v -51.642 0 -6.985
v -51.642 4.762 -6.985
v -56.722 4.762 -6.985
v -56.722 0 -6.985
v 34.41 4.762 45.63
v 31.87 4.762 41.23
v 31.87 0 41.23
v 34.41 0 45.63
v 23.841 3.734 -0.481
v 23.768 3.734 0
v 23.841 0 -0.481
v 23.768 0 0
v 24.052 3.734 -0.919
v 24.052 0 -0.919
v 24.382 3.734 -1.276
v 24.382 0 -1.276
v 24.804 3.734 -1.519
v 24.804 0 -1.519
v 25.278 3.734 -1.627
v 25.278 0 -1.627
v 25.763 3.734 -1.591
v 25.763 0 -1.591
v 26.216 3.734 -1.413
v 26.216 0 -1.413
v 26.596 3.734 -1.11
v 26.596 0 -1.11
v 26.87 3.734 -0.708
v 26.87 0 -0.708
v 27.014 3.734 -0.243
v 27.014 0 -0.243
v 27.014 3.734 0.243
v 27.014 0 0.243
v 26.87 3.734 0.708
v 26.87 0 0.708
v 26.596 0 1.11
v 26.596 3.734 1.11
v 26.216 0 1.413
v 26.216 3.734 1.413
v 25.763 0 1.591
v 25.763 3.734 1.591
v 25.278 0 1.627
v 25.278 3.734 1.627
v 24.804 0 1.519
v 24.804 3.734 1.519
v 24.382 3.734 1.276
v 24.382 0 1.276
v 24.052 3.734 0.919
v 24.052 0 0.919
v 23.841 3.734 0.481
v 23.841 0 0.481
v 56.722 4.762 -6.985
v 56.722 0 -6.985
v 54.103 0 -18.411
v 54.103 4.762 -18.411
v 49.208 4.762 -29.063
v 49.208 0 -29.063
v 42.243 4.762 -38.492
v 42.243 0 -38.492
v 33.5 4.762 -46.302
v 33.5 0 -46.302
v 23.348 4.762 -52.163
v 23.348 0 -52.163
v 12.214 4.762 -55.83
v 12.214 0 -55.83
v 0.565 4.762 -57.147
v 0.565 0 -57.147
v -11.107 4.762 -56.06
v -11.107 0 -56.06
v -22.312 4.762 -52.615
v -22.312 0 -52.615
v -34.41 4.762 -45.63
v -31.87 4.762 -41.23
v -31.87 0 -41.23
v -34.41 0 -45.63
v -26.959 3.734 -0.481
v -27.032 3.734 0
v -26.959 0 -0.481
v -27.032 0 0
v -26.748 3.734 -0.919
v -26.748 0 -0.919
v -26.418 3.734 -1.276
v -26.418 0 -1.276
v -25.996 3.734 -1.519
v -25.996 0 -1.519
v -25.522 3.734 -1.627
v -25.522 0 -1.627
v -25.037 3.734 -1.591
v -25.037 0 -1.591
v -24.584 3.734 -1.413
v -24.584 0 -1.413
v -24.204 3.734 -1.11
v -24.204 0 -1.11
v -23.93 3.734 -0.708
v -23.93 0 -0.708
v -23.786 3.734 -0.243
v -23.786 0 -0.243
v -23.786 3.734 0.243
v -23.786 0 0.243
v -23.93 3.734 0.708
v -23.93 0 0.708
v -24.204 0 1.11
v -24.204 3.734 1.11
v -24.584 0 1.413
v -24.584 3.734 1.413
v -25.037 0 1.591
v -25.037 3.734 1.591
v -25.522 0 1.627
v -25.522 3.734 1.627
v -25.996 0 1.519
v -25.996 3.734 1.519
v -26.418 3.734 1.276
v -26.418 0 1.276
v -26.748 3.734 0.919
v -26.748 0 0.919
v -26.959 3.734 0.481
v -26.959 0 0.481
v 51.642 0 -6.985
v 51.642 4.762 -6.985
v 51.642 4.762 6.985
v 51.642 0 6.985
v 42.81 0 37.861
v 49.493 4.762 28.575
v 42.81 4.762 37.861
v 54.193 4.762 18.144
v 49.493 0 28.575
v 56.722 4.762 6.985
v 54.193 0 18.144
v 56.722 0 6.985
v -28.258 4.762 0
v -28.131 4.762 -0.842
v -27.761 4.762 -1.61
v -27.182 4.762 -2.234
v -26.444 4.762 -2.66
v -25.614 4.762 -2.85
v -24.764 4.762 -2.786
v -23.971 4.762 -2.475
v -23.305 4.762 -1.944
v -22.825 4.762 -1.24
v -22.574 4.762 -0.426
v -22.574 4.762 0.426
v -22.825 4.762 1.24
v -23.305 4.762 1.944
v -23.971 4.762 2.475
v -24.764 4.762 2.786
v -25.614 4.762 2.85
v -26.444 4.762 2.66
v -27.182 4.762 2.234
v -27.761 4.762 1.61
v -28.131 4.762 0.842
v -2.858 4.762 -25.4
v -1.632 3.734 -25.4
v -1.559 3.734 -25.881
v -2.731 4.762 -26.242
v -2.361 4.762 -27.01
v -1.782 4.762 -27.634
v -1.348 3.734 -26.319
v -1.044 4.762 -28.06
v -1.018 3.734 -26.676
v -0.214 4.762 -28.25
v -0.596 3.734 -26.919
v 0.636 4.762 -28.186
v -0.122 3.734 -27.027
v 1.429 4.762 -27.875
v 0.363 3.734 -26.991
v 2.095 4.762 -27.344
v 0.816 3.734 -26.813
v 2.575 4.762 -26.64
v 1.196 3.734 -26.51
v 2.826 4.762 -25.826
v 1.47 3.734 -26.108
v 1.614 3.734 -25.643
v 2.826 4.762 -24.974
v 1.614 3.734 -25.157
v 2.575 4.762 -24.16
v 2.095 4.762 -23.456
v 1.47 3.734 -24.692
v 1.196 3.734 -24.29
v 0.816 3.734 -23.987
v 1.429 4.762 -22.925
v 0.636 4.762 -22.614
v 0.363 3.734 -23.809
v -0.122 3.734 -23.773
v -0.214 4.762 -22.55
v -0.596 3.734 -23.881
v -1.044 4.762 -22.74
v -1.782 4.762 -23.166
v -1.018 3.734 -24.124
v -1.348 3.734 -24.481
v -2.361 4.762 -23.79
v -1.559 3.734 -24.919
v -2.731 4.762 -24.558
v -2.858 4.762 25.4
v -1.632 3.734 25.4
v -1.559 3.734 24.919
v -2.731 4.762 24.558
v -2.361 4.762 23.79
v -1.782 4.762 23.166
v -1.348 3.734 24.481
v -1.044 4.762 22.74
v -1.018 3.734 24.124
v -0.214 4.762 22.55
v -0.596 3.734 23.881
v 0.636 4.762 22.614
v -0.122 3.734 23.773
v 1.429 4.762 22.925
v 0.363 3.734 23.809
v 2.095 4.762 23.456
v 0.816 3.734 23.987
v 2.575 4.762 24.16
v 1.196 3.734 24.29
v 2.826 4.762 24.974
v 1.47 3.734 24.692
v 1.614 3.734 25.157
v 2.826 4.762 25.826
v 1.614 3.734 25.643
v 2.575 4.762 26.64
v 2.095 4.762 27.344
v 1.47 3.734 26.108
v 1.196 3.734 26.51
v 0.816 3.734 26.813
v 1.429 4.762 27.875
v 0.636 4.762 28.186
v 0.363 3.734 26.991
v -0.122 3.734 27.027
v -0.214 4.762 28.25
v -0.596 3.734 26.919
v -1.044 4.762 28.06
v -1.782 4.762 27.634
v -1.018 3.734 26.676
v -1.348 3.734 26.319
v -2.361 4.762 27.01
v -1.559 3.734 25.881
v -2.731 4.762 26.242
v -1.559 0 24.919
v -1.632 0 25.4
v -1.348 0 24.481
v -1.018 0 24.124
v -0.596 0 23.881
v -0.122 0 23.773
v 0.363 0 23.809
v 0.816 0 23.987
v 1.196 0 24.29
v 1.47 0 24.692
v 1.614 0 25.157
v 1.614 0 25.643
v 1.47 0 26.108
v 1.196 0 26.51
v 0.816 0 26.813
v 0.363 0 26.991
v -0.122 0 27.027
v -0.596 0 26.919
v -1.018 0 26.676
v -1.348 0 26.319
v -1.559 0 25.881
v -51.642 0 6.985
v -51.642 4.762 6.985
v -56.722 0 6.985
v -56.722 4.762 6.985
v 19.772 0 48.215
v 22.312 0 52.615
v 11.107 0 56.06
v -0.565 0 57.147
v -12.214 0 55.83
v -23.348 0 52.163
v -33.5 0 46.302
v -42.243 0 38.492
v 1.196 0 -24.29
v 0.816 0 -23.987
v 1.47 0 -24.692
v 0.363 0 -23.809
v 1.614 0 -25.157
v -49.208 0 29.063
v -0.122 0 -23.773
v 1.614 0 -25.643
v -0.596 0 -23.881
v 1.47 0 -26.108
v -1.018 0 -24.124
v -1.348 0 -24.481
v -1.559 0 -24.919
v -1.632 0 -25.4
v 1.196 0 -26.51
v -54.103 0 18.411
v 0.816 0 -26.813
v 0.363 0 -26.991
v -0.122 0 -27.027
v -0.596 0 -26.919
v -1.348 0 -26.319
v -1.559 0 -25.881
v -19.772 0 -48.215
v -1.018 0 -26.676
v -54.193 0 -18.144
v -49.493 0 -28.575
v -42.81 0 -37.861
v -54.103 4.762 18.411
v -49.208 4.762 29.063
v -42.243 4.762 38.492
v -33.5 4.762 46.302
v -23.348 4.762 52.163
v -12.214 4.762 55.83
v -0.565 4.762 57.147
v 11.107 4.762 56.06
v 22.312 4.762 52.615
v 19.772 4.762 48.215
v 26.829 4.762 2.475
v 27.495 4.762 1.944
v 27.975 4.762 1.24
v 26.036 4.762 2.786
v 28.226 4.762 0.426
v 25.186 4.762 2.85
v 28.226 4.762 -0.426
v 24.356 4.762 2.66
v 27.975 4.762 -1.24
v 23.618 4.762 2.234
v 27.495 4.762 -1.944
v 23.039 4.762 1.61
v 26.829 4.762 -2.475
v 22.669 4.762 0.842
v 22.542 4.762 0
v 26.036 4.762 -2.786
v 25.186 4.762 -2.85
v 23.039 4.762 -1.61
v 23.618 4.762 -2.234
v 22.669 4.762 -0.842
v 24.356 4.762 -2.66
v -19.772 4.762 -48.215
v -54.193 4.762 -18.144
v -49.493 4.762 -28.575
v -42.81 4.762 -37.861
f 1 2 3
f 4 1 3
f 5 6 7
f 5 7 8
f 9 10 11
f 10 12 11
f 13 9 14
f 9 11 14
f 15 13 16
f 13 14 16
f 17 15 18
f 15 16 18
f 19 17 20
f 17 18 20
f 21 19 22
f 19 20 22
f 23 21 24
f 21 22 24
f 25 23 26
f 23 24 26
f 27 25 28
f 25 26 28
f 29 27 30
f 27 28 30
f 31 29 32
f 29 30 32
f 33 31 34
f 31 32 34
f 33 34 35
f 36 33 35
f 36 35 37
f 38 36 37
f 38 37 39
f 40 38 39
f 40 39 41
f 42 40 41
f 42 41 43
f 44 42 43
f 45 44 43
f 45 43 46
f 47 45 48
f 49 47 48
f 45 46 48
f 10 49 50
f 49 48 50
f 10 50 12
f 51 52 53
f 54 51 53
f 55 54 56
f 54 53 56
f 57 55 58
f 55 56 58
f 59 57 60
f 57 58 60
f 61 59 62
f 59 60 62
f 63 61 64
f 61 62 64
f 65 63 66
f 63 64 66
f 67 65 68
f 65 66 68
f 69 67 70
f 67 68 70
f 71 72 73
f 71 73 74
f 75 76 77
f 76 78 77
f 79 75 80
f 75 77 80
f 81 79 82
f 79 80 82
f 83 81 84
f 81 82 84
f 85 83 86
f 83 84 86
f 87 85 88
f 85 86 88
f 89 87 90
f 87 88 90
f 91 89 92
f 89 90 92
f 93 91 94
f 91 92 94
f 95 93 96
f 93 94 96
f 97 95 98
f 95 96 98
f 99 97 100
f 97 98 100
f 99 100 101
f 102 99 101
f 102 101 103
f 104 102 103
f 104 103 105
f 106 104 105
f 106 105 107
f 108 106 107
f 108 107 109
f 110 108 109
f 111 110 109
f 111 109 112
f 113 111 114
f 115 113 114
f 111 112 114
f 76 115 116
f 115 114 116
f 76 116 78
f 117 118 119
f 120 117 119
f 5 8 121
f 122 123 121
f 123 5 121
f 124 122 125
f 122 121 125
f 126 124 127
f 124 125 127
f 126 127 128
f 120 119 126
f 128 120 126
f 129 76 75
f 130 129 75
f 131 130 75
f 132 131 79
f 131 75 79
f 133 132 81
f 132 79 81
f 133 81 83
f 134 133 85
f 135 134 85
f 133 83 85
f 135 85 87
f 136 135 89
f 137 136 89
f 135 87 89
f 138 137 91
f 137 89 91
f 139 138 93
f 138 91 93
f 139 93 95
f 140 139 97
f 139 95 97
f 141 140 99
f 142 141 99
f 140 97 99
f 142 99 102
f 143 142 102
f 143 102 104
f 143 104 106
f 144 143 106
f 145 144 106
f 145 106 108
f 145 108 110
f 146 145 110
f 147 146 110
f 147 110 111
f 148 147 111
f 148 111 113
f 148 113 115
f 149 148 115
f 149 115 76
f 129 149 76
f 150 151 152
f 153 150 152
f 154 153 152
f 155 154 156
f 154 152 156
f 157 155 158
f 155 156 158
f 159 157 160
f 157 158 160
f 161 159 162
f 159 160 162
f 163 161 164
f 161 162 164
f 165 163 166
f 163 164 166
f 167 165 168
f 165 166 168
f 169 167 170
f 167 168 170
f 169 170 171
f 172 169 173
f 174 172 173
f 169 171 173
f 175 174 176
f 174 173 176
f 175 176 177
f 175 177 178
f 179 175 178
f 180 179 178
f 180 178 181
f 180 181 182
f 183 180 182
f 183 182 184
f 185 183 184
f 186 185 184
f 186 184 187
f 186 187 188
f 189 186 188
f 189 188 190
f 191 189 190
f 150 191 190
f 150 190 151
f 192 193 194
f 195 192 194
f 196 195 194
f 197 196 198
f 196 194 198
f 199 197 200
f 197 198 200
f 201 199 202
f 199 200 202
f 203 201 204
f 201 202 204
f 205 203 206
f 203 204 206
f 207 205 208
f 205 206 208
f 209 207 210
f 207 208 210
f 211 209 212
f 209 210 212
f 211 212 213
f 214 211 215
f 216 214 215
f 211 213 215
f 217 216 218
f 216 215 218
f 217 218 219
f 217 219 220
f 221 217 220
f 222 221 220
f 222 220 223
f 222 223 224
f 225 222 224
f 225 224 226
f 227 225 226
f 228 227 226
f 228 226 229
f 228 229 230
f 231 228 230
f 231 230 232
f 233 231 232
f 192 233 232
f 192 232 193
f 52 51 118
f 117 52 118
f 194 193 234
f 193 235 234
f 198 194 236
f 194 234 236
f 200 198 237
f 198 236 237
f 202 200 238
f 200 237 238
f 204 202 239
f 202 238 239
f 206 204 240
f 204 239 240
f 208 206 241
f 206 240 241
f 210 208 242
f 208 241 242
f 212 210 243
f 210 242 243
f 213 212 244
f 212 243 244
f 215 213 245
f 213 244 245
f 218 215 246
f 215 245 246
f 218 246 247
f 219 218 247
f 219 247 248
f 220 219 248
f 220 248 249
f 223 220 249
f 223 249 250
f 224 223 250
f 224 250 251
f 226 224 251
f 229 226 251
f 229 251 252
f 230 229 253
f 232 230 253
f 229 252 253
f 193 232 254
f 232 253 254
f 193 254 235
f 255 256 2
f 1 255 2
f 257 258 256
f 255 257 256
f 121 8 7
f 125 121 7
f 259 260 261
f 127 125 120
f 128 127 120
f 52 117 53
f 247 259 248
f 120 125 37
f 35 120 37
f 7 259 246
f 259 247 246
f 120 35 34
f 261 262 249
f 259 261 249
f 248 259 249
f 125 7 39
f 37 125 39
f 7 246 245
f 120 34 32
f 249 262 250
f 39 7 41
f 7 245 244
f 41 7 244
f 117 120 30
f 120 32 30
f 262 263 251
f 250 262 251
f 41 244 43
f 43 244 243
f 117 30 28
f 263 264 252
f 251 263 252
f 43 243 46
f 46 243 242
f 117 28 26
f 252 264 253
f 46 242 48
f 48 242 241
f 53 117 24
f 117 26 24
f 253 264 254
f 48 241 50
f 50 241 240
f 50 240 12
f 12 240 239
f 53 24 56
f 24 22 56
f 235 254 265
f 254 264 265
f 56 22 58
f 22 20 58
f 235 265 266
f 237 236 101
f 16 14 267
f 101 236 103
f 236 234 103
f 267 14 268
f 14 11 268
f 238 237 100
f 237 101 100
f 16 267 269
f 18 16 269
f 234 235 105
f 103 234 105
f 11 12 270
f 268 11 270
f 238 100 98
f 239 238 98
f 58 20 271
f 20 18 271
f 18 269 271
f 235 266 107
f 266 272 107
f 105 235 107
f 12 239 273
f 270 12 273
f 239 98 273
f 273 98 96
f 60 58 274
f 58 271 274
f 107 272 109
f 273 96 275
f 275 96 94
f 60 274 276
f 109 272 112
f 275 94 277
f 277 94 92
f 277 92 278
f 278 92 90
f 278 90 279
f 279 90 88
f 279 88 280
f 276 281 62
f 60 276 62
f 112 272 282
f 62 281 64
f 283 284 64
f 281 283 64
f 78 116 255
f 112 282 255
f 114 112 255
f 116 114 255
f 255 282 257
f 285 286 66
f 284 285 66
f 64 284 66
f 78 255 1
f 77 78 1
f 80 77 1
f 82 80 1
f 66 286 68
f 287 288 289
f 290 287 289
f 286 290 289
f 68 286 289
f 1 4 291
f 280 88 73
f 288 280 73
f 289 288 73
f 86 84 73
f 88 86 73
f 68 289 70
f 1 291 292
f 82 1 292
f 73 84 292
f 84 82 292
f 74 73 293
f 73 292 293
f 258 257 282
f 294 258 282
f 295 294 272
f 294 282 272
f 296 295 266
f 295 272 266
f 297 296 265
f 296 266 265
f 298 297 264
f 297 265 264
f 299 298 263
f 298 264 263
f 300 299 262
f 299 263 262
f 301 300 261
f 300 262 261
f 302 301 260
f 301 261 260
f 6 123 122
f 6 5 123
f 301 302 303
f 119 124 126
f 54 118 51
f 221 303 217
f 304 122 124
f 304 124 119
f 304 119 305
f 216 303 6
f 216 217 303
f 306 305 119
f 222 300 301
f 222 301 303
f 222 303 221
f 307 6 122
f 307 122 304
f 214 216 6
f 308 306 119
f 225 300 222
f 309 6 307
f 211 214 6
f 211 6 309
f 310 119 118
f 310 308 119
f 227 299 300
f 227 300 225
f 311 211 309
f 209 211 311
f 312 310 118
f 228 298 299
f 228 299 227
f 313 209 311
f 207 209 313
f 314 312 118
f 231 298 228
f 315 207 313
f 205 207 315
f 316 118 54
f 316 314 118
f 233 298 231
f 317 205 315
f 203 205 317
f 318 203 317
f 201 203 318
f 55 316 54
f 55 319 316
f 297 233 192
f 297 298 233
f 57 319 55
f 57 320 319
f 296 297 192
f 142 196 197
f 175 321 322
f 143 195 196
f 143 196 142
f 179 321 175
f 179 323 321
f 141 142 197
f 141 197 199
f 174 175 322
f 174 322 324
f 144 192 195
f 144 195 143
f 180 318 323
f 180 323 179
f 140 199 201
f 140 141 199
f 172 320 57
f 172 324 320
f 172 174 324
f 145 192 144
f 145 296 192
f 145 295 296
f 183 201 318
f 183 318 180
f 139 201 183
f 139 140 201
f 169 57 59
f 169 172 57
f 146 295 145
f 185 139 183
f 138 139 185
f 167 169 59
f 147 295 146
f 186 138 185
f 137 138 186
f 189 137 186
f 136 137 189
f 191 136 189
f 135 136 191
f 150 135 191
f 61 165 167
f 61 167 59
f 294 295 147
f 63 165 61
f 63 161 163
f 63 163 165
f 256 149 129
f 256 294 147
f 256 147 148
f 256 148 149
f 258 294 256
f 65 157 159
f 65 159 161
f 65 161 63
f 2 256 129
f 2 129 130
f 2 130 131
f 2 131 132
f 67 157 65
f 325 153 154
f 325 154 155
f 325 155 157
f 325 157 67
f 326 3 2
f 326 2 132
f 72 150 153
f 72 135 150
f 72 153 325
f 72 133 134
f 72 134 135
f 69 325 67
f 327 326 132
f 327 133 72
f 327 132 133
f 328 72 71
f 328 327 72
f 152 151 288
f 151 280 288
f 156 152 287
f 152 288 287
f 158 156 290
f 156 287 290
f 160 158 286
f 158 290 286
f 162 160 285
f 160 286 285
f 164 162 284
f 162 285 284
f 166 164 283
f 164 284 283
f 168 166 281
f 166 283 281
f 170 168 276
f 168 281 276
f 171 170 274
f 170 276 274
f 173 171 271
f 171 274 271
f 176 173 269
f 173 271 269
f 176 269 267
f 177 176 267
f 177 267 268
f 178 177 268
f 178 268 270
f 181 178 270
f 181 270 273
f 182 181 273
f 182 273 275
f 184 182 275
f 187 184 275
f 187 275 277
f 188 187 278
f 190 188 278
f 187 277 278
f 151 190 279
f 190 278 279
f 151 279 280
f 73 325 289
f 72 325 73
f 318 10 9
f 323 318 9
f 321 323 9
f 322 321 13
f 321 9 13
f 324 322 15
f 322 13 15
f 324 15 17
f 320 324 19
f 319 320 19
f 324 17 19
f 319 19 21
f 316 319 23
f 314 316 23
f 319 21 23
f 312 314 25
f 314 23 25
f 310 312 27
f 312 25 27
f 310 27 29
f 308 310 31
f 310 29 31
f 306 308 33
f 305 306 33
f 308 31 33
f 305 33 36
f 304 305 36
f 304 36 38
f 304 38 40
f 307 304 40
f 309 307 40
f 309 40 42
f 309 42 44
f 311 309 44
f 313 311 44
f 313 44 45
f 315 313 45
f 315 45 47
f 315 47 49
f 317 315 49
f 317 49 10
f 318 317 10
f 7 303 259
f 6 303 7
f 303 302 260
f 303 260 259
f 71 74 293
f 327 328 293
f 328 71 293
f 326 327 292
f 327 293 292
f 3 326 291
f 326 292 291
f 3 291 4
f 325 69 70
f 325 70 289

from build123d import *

# Parameters (mm, degrees)
SKETCH1_R                                         = 57.15
BOSS_EXTRUDE1_DEPTH                               = 4.7625
CUT_EXTRUDE2_REACH                                = 82.963
CUT_EXTRUDE3_REACH                                = 82.661
CSK_FOR_4_FLAT_HEAD_MACHINE_SCREW_100_D           = 3.2639
CSK_FOR_4_FLAT_HEAD_MACHINE_SCREW_100_CSINK_D     = 5.715
CSK_FOR_4_FLAT_HEAD_MACHINE_SCREW_100_CSINK_ANGLE = 100


with BuildPart() as part:
    # Sketch1 → Boss-Extrude1 (new body)
    with BuildSketch(Plane(origin=(0, 0, 0), x_dir=(1, 0, 0), z_dir=(0, 1, 0))):
        with Locations(Location((0, 0, 0), (0, 0, 90))):
            Circle(SKETCH1_R)
    extrude(amount=BOSS_EXTRUDE1_DEPTH)

    # Sketch2 → Cut-Extrude2 (cut, up to next)
    with BuildSketch(Plane(origin=(0, 4.7625, 0), x_dir=(1, 0, 0), z_dir=(0, 1, 0)), mode=Mode.PRIVATE) as cut_extrude2_sk1:
        with BuildLine():
            Line((51.641532728, 6.985), (51.641532728, -6.985))
            Line((51.641532728, -6.985), (56.721532728, -6.985))
            ThreePointArc((56.721532728, -6.985), (57.15, 0), (56.721532728, 6.985))
            Line((56.721532728, 6.985), (51.641532728, 6.985))
        make_face()
    cut_extrude2_tool1 = extrude(cut_extrude2_sk1.sketch, amount=-CUT_EXTRUDE2_REACH, mode=Mode.PRIVATE) & part.part
    # Sketch2 → Cut-Extrude2 (cut, up to next)
    with BuildSketch(Plane(origin=(0, 4.7625, 0), x_dir=(1, 0, 0), z_dir=(0, 1, 0)), mode=Mode.PRIVATE) as cut_extrude2_sk2:
        with BuildLine():
            Line((-51.641532728, 6.985), (-56.721532728, 6.985))
            ThreePointArc((-56.721532728, 6.985), (-57.15, 0), (-56.721532728, -6.985))
            Line((-56.721532728, -6.985), (-51.641532728, -6.985))
            Line((-51.641532728, -6.985), (-51.641532728, 6.985))
        make_face()
    cut_extrude2_tool2 = extrude(cut_extrude2_sk2.sketch, amount=-CUT_EXTRUDE2_REACH, mode=Mode.PRIVATE) & part.part
    add(cut_extrude2_tool1.solids().sort_by_distance((54.325982, 4.7625, 0))[0], mode=Mode.SUBTRACT)
    add(cut_extrude2_tool2.solids().sort_by_distance((-54.325982, 4.7625, 0))[0], mode=Mode.SUBTRACT)

    # Sketch3 → Cut-Extrude3 (cut, up to next)
    with BuildSketch(Plane(origin=(0, 4.7625, 0), x_dir=(1, 0, 0), z_dir=(0, 1, 0)), mode=Mode.PRIVATE) as cut_extrude3_sk1:
        with BuildLine():
            Line((19.771578919, -48.215379233), (31.869953809, -41.230379233))
            Line((31.869953809, -41.230379233), (34.409953809, -45.629788284))
            ThreePointArc((34.409953809, -45.629788284), (28.575, -49.493351826), (22.311578919, -52.614788284))
            Line((22.311578919, -52.614788284), (19.771578919, -48.215379233))
        make_face()
    cut_extrude3_tool1 = extrude(cut_extrude3_sk1.sketch, amount=-CUT_EXTRUDE3_REACH, mode=Mode.PRIVATE) & part.part
    # Sketch3 → Cut-Extrude3 (cut, up to next)
    with BuildSketch(Plane(origin=(0, 4.7625, 0), x_dir=(1, 0, 0), z_dir=(0, 1, 0)), mode=Mode.PRIVATE) as cut_extrude3_sk2:
        with BuildLine():
            Line((-31.869953809, 41.230379233), (-34.409953809, 45.629788284))
            ThreePointArc((-34.409953809, 45.629788284), (-28.575, 49.493351826), (-22.311578919, 52.614788284))
            Line((-22.311578919, 52.614788284), (-19.771578919, 48.215379233))
            Line((-19.771578919, 48.215379233), (-31.869953809, 41.230379233))
        make_face()
    cut_extrude3_tool2 = extrude(cut_extrude3_sk2.sketch, amount=-CUT_EXTRUDE3_REACH, mode=Mode.PRIVATE) & part.part
    add(cut_extrude3_tool1.solids().sort_by_distance((27.162991, 4.7625, 47.04768))[0], mode=Mode.SUBTRACT)
    add(cut_extrude3_tool2.solids().sort_by_distance((-27.162991, 4.7625, -47.04768))[0], mode=Mode.SUBTRACT)

    # CSK for #4 Flat Head Machine Screw (100)1 (through all)
    with Locations(Plane(origin=(0, 4.7625, 0), x_dir=(1, 0, 0), z_dir=(0, 1, 0))):
        with Locations((25.4, 0), (0, -25.4), (0, 25.4), (-25.4, 0)):
            CounterSinkHole(CSK_FOR_4_FLAT_HEAD_MACHINE_SCREW_100_D / 2, CSK_FOR_4_FLAT_HEAD_MACHINE_SCREW_100_CSINK_D / 2, counter_sink_angle=CSK_FOR_4_FLAT_HEAD_MACHINE_SCREW_100_CSINK_ANGLE)


solid = part.part
